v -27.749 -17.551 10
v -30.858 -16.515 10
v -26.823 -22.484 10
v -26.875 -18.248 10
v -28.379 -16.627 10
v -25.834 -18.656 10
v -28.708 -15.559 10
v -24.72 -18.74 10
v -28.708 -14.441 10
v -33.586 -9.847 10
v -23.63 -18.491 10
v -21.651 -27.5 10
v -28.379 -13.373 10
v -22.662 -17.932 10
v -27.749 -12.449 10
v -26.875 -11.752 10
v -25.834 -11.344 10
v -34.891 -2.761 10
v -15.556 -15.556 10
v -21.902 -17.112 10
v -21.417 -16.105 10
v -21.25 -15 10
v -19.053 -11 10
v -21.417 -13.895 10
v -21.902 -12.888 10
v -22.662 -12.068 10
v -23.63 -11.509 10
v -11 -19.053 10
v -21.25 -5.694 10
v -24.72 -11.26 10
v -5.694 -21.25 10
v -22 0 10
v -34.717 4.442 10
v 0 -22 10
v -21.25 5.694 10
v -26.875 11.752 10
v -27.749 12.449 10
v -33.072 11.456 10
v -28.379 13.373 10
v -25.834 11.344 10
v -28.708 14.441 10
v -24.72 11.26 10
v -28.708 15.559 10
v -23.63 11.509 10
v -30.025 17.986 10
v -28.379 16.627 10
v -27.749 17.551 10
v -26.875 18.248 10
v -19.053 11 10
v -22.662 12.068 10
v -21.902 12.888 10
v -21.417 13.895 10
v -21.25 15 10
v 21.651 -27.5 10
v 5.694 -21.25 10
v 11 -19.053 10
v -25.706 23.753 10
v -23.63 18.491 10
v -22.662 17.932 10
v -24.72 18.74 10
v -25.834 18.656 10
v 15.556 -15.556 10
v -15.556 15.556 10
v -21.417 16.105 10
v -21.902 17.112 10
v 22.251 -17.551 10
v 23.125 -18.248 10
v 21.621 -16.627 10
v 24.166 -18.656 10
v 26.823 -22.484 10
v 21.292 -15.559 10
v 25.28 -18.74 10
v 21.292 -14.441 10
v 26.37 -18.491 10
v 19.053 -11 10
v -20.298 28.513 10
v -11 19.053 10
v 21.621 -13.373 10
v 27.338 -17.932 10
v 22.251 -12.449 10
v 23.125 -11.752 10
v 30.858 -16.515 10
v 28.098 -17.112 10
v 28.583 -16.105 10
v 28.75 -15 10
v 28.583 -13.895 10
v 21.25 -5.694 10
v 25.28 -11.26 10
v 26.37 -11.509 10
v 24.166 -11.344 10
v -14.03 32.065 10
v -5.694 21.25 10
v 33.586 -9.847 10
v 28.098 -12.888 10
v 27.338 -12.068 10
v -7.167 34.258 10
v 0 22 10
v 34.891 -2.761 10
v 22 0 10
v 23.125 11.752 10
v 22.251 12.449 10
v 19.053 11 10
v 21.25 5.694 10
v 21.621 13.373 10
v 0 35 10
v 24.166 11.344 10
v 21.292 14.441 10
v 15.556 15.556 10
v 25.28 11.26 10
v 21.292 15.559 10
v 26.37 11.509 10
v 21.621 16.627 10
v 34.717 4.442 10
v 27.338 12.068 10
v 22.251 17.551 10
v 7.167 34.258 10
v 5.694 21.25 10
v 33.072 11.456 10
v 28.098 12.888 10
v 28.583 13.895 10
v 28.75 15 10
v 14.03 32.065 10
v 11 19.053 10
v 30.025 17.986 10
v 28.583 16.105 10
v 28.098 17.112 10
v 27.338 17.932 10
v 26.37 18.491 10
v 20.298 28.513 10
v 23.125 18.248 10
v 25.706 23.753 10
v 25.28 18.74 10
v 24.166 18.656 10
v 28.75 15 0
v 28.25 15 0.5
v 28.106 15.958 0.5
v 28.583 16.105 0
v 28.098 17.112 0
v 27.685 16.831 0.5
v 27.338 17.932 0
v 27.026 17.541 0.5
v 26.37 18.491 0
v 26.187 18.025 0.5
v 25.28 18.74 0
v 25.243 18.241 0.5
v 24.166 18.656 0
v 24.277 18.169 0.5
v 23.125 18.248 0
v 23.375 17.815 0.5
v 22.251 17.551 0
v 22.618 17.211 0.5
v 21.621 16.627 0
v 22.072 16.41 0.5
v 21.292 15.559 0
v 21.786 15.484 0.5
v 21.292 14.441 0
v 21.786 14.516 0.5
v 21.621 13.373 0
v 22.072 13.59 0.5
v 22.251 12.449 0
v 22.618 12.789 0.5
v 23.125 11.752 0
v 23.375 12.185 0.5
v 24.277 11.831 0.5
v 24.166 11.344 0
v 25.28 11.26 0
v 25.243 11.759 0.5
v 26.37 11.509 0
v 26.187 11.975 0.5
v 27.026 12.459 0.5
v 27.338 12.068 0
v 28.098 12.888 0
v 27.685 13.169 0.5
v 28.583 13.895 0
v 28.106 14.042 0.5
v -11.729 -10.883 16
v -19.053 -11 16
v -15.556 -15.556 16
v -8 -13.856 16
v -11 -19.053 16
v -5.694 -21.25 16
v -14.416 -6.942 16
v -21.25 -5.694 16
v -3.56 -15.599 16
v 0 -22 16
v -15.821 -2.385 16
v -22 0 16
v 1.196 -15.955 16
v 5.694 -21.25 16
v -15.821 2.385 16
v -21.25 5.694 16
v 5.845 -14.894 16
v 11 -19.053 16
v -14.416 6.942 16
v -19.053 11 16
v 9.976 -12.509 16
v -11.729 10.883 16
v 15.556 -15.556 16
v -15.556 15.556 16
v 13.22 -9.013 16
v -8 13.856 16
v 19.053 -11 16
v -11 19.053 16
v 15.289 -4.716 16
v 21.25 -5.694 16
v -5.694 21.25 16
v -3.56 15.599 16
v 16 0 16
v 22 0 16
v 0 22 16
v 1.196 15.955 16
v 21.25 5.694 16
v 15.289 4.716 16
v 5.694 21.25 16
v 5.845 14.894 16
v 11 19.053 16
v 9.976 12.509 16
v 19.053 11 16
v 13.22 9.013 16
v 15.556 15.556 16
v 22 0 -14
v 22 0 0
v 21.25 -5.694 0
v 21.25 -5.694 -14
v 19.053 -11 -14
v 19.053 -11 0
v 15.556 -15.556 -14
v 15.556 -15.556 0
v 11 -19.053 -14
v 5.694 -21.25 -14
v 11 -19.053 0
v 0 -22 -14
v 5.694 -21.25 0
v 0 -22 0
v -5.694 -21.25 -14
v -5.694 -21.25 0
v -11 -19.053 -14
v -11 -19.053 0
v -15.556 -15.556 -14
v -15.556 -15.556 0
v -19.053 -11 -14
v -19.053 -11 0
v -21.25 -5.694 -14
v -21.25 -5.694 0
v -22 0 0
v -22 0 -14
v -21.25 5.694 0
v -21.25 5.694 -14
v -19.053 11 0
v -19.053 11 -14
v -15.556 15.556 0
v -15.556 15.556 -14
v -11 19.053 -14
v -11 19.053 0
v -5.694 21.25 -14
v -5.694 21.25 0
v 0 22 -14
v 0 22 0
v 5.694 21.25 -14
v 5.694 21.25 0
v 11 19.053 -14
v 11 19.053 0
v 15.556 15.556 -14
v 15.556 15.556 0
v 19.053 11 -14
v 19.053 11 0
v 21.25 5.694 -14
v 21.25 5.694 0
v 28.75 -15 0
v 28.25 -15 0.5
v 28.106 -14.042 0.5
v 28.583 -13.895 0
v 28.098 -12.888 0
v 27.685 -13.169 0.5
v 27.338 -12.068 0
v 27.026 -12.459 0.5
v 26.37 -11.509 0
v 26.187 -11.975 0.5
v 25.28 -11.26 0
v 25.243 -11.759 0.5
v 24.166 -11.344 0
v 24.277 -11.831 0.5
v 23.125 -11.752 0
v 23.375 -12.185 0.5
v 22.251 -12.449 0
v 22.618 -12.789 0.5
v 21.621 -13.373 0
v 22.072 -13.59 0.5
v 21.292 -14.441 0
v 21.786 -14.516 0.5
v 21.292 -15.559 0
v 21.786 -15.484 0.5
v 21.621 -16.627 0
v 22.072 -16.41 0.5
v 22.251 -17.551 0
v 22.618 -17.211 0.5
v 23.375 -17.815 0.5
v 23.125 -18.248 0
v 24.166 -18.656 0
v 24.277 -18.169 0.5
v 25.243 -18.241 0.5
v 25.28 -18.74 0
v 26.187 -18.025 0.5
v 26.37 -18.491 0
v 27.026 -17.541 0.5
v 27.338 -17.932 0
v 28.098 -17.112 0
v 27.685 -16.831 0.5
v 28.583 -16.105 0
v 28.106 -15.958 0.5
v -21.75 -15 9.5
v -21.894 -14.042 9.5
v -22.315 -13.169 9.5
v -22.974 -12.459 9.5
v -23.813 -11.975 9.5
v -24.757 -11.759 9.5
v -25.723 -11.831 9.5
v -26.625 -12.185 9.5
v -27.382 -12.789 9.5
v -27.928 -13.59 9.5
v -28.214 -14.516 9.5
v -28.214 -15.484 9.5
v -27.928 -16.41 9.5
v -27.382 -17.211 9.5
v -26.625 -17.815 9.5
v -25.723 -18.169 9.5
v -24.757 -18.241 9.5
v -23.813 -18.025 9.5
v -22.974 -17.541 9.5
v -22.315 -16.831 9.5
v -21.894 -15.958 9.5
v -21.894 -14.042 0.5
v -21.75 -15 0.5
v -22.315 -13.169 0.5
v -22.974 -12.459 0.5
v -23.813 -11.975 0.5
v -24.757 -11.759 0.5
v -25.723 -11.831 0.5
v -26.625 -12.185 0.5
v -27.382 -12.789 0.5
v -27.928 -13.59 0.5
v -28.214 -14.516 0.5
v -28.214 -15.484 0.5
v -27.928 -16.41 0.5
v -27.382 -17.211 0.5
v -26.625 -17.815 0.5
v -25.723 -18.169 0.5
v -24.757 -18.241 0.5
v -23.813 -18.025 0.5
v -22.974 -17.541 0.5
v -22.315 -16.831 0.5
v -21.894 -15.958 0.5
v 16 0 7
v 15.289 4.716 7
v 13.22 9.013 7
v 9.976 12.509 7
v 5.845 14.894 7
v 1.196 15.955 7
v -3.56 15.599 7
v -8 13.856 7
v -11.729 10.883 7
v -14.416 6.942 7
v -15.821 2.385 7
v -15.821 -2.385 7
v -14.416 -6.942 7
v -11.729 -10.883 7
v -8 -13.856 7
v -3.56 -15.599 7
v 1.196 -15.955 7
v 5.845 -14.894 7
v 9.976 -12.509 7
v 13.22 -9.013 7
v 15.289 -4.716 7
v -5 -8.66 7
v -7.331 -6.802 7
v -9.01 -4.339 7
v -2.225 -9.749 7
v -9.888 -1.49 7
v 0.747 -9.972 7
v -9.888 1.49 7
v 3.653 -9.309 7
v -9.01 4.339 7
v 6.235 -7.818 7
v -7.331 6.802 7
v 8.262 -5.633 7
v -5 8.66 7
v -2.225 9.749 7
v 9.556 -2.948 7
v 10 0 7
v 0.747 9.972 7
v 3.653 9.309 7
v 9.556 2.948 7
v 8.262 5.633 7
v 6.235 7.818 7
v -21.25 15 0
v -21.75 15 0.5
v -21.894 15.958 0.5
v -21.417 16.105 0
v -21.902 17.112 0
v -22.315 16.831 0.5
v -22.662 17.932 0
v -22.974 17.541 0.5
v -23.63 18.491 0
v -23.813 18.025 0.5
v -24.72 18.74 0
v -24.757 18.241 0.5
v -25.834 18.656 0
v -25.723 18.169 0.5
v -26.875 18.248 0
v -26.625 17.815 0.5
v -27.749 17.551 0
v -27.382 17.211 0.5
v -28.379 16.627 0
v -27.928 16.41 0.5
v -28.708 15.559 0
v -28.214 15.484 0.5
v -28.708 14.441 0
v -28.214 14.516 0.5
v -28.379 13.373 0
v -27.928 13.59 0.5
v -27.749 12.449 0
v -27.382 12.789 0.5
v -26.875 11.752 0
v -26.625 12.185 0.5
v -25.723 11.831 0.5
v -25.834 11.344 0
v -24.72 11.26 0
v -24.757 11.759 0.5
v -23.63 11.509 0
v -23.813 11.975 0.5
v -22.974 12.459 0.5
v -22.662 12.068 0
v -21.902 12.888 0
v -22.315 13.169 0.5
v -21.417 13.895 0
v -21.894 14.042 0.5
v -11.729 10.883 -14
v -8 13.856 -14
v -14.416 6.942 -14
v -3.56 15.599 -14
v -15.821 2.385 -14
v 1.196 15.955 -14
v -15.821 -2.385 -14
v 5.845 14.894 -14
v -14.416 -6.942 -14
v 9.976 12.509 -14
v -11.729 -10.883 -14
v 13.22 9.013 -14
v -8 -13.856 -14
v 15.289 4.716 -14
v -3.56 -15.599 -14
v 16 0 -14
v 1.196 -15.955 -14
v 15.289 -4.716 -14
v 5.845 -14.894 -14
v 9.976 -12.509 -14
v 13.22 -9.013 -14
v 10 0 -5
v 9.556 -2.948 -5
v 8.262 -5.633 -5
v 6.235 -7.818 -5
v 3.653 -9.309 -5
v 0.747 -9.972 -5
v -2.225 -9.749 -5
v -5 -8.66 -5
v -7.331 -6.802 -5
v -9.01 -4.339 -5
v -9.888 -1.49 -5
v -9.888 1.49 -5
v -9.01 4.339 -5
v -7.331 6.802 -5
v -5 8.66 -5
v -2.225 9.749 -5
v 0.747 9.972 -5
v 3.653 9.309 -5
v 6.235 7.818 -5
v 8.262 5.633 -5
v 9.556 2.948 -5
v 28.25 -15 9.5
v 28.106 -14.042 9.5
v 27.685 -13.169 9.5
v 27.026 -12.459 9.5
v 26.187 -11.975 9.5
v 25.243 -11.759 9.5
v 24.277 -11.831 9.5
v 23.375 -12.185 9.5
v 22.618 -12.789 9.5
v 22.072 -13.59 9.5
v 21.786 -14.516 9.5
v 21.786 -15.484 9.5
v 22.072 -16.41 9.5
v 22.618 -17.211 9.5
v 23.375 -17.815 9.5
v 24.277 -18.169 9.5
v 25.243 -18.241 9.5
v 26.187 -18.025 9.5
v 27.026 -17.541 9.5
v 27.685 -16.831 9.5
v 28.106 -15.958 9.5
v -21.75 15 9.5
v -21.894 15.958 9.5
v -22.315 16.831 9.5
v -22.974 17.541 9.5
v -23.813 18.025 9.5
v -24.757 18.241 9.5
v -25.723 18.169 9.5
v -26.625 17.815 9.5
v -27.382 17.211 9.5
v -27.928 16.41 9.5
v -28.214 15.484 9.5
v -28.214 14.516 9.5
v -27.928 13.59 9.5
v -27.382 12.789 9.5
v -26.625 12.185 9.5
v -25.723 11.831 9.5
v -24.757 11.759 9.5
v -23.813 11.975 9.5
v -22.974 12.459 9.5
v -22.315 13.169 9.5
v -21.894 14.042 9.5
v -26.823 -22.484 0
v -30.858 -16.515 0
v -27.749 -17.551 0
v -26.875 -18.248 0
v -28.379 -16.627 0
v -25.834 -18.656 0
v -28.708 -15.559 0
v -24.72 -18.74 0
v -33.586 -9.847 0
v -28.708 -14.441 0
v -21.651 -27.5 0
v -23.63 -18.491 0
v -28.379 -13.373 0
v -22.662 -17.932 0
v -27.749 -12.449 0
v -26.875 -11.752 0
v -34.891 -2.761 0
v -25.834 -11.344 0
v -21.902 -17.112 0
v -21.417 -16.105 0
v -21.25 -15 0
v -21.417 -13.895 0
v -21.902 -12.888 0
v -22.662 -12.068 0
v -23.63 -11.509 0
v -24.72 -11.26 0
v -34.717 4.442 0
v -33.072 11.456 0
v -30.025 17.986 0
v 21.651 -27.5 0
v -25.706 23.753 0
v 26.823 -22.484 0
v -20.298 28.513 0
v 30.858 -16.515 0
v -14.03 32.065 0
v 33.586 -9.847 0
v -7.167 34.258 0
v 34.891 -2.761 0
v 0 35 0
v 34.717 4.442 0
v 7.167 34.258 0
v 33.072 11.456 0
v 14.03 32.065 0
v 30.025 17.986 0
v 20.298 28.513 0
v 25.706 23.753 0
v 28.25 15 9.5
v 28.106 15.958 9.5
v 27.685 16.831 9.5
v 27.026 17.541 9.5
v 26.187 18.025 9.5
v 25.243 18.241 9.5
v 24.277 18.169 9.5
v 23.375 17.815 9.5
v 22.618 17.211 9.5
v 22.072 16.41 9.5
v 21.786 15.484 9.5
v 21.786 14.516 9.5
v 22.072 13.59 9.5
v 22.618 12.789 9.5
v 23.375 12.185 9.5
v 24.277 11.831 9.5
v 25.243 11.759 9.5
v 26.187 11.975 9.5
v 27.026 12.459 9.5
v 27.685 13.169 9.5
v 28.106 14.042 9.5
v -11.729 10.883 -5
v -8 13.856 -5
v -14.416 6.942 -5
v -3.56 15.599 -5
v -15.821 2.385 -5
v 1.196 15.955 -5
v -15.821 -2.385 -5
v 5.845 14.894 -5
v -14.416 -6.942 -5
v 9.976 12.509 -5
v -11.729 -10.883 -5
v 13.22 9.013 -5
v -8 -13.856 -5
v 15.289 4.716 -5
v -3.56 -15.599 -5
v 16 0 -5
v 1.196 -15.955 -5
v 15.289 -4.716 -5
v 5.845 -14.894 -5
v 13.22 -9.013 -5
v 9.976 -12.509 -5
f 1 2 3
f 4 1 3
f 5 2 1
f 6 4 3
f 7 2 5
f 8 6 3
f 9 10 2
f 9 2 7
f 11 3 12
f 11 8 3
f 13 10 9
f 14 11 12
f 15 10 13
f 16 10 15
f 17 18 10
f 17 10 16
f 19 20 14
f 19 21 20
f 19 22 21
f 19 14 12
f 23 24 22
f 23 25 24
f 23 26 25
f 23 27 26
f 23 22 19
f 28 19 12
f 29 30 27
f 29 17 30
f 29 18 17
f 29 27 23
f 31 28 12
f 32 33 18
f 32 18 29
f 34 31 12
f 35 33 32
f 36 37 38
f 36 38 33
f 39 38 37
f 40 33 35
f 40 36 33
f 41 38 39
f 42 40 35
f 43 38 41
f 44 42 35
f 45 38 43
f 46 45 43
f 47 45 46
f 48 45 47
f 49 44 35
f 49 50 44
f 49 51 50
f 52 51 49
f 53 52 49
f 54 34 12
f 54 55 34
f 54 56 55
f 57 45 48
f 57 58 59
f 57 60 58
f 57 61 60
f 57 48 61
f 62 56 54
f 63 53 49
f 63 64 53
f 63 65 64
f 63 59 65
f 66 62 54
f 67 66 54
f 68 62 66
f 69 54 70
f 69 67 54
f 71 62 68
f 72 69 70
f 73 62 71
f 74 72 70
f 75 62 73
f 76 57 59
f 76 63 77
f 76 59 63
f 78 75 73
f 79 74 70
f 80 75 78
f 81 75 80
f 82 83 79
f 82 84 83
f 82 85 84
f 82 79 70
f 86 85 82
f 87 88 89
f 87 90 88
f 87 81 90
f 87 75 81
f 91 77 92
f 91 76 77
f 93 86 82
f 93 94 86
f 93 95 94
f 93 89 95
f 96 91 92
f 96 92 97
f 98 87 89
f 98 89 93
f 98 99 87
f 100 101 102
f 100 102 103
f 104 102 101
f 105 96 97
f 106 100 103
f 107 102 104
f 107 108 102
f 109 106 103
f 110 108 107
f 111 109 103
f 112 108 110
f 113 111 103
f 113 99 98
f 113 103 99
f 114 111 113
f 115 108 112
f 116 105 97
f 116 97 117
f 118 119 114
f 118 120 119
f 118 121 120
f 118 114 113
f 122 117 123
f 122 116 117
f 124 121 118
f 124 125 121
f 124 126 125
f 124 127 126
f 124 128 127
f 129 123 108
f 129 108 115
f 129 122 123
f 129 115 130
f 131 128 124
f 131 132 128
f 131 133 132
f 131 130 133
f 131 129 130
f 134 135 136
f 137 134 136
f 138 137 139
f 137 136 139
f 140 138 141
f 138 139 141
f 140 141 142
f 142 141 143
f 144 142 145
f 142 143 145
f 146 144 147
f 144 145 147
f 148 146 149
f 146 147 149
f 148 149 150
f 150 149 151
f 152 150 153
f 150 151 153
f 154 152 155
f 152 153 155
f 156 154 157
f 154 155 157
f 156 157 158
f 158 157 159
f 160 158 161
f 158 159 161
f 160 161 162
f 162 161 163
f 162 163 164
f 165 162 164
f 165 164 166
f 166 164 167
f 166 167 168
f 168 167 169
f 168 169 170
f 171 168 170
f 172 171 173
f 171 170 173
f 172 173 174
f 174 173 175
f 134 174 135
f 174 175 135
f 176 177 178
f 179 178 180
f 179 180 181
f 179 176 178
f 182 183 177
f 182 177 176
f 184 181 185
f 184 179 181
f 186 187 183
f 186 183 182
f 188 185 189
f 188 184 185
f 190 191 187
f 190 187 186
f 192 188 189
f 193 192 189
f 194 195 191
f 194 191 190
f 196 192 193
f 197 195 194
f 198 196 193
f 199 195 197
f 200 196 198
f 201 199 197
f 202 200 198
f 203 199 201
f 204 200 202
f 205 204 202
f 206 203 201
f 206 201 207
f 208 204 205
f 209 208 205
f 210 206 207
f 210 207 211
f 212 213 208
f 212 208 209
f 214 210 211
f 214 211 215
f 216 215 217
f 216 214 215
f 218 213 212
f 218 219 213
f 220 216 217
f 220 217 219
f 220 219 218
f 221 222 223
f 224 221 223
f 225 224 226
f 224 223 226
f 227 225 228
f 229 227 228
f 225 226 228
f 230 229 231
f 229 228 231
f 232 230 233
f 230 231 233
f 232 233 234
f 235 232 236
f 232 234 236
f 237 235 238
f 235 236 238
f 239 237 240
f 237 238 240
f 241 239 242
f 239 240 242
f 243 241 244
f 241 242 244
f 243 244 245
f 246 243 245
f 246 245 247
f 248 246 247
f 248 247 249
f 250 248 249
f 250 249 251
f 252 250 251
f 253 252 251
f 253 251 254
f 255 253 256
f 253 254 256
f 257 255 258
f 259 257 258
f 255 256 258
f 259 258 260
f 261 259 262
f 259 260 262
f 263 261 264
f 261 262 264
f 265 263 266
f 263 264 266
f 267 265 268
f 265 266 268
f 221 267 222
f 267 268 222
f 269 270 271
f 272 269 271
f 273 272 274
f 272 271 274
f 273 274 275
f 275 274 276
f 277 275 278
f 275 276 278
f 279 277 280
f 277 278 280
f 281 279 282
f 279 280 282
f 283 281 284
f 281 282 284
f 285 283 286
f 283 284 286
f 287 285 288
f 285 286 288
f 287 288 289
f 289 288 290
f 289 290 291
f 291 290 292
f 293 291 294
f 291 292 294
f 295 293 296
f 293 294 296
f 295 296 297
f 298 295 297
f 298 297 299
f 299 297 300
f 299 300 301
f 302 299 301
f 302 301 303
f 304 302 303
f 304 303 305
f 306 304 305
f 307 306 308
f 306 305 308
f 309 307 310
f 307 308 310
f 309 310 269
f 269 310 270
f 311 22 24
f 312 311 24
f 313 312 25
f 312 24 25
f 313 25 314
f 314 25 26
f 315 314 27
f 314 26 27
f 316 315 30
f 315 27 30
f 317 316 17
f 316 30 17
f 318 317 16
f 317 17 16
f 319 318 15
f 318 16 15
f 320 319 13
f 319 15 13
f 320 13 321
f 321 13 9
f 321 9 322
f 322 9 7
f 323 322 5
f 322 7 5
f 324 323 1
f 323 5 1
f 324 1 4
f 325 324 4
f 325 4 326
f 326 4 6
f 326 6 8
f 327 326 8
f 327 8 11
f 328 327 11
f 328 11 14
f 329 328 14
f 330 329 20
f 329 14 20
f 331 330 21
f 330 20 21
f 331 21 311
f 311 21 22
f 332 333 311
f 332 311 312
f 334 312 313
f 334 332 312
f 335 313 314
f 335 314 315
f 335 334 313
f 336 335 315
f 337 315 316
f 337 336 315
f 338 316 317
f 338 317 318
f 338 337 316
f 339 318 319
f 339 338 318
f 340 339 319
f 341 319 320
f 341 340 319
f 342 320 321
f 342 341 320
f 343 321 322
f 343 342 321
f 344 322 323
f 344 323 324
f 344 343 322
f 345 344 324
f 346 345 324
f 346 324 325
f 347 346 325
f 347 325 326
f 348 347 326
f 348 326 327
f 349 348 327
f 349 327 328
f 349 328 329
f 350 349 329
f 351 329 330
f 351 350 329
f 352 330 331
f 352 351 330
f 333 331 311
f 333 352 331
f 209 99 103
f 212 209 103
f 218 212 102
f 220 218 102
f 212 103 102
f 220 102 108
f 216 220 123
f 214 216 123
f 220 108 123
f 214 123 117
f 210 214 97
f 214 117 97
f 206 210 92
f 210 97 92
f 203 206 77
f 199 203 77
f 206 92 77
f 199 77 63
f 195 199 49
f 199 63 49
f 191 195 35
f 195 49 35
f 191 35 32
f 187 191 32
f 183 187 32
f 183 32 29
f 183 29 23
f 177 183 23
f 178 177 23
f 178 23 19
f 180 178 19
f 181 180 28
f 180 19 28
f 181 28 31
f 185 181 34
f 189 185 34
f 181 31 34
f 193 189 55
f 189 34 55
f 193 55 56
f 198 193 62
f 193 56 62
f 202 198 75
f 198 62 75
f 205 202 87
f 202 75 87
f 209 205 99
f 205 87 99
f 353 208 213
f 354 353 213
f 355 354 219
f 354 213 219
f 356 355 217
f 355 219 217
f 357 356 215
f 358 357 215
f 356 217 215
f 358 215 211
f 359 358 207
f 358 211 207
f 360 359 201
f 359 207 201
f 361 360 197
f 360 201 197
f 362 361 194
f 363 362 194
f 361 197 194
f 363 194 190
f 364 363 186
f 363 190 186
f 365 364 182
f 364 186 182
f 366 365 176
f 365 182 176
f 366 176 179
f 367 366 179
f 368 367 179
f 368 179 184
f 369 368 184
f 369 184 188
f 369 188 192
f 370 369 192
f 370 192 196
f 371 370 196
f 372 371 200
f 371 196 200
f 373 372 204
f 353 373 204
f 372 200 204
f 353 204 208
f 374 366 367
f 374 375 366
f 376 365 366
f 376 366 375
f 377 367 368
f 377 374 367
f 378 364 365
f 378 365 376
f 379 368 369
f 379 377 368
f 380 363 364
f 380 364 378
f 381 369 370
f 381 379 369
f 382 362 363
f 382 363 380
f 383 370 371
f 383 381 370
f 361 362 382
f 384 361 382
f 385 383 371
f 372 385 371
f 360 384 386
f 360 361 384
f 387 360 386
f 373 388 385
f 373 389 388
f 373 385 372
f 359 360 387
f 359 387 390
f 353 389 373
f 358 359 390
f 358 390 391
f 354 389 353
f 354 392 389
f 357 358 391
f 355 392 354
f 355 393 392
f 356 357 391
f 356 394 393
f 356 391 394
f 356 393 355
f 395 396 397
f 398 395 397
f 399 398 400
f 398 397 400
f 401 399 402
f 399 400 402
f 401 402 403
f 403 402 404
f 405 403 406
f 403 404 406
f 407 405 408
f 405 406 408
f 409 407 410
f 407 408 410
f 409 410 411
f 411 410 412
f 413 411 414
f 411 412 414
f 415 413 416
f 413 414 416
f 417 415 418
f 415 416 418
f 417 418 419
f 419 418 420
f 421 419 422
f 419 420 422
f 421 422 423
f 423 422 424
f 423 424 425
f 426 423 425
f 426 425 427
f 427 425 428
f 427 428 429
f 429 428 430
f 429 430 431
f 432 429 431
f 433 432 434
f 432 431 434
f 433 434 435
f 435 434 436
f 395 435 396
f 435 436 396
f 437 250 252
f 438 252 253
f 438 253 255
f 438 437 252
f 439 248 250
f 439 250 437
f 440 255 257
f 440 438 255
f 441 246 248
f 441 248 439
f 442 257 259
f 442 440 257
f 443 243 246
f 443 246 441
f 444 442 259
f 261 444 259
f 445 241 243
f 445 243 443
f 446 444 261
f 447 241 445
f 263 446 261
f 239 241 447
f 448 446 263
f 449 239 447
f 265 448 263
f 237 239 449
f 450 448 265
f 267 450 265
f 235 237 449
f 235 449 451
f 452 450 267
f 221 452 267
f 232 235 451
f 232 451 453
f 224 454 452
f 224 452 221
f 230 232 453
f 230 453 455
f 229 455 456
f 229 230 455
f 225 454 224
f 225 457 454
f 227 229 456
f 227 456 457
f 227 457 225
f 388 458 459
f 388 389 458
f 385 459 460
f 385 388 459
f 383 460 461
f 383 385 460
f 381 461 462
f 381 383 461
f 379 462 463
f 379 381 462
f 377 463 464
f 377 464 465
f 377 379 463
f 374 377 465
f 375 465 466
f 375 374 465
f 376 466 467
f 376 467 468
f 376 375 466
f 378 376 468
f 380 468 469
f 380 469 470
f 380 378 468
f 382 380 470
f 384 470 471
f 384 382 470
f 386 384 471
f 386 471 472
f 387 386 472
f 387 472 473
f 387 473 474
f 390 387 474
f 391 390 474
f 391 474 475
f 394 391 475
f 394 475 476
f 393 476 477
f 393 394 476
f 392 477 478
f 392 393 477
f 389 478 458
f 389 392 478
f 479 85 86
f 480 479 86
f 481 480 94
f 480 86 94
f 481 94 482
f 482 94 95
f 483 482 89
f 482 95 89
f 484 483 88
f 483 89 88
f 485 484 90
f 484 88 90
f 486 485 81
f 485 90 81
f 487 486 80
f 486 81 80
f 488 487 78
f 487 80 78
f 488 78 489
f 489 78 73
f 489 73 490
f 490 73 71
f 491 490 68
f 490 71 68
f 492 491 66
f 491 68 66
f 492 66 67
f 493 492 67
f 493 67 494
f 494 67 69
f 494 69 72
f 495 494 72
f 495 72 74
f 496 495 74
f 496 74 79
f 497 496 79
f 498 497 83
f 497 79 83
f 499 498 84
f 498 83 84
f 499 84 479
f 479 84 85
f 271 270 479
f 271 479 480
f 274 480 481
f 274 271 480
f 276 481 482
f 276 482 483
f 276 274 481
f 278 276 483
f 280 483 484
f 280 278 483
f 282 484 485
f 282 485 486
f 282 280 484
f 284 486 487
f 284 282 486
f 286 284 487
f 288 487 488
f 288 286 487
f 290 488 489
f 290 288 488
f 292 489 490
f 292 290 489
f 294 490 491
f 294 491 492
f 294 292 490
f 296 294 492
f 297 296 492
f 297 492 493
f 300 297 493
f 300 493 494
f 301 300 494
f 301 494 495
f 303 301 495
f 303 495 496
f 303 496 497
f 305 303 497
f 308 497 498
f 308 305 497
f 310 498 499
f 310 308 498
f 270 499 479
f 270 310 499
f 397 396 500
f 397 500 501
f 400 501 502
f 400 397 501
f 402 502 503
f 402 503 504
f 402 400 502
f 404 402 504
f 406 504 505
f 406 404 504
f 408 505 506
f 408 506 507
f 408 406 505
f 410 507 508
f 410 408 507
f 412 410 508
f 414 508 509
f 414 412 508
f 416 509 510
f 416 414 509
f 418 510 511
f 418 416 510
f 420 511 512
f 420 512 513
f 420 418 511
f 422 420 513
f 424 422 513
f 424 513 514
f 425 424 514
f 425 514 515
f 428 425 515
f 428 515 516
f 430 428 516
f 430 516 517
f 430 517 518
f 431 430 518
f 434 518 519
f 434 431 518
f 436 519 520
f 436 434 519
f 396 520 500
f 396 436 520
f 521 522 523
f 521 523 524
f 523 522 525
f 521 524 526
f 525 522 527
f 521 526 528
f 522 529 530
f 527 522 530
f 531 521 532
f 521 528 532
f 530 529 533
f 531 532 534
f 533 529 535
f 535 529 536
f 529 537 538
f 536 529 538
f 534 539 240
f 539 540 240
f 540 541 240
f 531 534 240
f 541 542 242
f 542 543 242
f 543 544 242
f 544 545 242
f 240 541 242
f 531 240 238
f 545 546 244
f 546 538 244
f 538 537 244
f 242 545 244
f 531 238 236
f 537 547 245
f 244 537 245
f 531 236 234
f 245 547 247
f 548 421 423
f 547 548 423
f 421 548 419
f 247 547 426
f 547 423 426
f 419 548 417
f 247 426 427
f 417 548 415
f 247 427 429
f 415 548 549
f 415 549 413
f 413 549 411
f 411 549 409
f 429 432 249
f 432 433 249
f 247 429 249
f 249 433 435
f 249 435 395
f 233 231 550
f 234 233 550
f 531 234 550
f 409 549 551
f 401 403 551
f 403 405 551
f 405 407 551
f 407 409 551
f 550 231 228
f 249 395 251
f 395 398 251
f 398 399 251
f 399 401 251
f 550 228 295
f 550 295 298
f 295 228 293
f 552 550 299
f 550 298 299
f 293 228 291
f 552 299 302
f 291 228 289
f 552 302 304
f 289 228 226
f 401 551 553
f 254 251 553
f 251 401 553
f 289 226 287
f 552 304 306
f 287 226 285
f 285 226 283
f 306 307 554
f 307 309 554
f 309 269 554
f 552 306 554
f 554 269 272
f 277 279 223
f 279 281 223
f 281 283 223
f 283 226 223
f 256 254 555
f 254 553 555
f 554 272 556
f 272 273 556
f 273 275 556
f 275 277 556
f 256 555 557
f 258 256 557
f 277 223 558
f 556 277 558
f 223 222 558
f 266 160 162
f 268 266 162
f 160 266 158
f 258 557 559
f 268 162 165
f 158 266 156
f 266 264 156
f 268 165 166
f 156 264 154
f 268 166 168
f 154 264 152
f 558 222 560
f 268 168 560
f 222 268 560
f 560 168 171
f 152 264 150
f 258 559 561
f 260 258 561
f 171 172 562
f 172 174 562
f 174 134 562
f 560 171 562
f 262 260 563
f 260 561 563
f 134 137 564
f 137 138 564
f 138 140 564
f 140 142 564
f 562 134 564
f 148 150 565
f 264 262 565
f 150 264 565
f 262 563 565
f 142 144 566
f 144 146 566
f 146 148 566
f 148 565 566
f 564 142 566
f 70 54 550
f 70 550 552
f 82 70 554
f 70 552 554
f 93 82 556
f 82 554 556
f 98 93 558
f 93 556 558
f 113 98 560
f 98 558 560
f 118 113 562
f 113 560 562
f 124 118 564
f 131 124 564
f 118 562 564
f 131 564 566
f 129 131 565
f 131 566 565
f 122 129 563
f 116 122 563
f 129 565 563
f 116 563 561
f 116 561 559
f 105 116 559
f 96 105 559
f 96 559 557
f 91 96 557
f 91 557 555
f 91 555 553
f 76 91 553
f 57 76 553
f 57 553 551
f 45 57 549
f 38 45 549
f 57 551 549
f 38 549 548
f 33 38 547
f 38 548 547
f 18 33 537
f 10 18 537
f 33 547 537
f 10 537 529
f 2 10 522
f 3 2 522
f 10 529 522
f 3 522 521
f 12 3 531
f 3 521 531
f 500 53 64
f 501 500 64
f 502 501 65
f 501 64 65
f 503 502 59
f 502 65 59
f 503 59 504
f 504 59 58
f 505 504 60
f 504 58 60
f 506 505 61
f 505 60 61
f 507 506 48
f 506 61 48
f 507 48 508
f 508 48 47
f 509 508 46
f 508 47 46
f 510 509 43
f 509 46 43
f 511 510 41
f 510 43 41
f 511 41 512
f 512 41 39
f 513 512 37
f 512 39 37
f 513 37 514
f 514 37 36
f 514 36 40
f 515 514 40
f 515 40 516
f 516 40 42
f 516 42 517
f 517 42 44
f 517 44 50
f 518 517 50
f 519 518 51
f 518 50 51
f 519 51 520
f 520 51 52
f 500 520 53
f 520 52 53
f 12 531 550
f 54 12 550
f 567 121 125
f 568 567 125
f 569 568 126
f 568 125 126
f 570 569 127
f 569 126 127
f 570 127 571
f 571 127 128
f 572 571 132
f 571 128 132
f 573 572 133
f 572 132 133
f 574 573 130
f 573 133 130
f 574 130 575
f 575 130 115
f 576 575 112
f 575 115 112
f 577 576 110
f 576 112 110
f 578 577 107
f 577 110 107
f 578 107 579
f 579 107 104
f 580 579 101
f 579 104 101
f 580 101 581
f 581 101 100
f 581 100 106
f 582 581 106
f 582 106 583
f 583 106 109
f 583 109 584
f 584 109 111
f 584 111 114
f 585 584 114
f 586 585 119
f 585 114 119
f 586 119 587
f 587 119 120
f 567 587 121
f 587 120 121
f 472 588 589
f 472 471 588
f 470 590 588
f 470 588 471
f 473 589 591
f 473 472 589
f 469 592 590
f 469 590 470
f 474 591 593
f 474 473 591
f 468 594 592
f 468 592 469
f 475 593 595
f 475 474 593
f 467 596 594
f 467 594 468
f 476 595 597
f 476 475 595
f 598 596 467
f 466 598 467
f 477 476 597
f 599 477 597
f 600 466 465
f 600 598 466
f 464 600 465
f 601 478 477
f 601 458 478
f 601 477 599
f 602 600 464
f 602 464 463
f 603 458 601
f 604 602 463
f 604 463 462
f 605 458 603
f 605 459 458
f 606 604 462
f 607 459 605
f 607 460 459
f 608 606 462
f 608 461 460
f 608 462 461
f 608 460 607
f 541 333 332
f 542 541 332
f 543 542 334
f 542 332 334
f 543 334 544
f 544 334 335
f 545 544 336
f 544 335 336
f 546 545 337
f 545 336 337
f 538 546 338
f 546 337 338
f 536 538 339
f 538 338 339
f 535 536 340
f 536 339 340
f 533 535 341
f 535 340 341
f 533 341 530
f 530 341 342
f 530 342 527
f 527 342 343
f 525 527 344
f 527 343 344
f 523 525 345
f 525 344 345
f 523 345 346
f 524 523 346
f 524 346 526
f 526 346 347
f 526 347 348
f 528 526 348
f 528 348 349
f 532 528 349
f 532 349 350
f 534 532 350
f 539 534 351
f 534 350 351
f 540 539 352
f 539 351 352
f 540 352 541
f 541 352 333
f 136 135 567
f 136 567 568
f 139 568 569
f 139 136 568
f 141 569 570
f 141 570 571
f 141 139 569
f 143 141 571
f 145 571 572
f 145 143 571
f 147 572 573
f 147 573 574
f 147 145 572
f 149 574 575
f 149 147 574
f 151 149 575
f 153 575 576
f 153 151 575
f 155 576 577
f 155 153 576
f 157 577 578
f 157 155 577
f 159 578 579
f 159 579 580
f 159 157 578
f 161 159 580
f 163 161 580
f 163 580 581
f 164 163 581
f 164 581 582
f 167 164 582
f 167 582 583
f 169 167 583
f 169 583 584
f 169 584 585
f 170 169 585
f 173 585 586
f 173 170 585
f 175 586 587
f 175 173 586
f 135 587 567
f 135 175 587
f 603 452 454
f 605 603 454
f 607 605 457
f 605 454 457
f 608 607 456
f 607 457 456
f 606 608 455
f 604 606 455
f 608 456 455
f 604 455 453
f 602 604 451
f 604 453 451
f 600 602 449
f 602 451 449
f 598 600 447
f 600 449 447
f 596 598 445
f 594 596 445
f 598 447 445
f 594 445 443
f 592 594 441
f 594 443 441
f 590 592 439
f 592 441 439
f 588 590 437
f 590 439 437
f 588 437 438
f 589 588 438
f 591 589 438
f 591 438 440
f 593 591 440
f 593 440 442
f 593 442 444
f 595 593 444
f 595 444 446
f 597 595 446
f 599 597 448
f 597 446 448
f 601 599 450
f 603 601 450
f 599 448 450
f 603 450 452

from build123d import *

# Parameters (mm, degrees)
F0_R     = 3.25
F0_R_2   = 10
F1_DEPTH = 10
F2_R     = 22
F2_R_2   = 10
F3_DEPTH = 6
F4_R     = 16
F4_R_2   = 10
F5_DEPTH = 9
F6_R     = 22
F6_R_2   = 10
F7_DEPTH = 14
F8_R     = 16
F8_R_2   = 10
F9_DEPTH = 9
F10_SIZE = 0.5


with BuildPart() as f1:
    # F0 (on Top) → F1 (new body)
    with BuildSketch(Plane.XY):
        with BuildLine():
            Line((-21.6506350946, -27.5), (21.6506350946, -27.5))
            ThreePointArc((21.6506350946, -27.5), (0, 35), (-21.6506350946, -27.5))
        make_face()
        with Locations((-25, -15)):
            Circle(F0_R, mode=Mode.SUBTRACT)
        with Locations((25, -15)):
            Circle(F0_R, mode=Mode.SUBTRACT)
        Circle(F0_R_2, mode=Mode.SUBTRACT)
        with Locations((-25, 15)):
            Circle(F0_R, mode=Mode.SUBTRACT)
        with Locations((25, 15)):
            Circle(F0_R, mode=Mode.SUBTRACT)
    extrude(amount=F1_DEPTH)

    # F2 (on face) → F3 (join)
    with BuildSketch(Plane.XY.offset(10)):
        Circle(F2_R)
        Circle(F2_R_2, mode=Mode.SUBTRACT)
    extrude(amount=F3_DEPTH)

    # F4 (on face) → F5 (cut)
    with BuildSketch(Plane.XY.offset(16)):
        Circle(F4_R)
        Circle(F4_R_2, mode=Mode.SUBTRACT)
    extrude(amount=-F5_DEPTH, mode=Mode.SUBTRACT)

    # F6 (on face) → F7 (join)
    with BuildSketch(Plane(origin=(0, 0, 0), x_dir=(1, 0, 0), z_dir=(0, 0, -1))):
        Circle(F6_R)
        Circle(F6_R_2, mode=Mode.SUBTRACT)
    extrude(amount=F7_DEPTH)

    # F8 (on face) → F9 (cut)
    with BuildSketch(Plane(origin=(0, 0, -14), x_dir=(1, 0, 0), z_dir=(0, 0, -1))):
        Circle(F8_R)
        Circle(F8_R_2, mode=Mode.SUBTRACT)
    extrude(amount=-F9_DEPTH, mode=Mode.SUBTRACT)

    # F10
    f10_edges = [f1.edges().sort_by_distance(p)[0] for p in [
        (-28.25, -15, 10),
        (-28.25, 15, 10),
        (21.75, 15, 10),
        (21.75, -15, 10),
        (21.75, 15, 0),
        (21.75, -15, 0),
        (-28.25, 15, 0),
        (-28.25, -15, 0),
    ]]
    chamfer(f10_edges, length=F10_SIZE)


solid = f1.part
